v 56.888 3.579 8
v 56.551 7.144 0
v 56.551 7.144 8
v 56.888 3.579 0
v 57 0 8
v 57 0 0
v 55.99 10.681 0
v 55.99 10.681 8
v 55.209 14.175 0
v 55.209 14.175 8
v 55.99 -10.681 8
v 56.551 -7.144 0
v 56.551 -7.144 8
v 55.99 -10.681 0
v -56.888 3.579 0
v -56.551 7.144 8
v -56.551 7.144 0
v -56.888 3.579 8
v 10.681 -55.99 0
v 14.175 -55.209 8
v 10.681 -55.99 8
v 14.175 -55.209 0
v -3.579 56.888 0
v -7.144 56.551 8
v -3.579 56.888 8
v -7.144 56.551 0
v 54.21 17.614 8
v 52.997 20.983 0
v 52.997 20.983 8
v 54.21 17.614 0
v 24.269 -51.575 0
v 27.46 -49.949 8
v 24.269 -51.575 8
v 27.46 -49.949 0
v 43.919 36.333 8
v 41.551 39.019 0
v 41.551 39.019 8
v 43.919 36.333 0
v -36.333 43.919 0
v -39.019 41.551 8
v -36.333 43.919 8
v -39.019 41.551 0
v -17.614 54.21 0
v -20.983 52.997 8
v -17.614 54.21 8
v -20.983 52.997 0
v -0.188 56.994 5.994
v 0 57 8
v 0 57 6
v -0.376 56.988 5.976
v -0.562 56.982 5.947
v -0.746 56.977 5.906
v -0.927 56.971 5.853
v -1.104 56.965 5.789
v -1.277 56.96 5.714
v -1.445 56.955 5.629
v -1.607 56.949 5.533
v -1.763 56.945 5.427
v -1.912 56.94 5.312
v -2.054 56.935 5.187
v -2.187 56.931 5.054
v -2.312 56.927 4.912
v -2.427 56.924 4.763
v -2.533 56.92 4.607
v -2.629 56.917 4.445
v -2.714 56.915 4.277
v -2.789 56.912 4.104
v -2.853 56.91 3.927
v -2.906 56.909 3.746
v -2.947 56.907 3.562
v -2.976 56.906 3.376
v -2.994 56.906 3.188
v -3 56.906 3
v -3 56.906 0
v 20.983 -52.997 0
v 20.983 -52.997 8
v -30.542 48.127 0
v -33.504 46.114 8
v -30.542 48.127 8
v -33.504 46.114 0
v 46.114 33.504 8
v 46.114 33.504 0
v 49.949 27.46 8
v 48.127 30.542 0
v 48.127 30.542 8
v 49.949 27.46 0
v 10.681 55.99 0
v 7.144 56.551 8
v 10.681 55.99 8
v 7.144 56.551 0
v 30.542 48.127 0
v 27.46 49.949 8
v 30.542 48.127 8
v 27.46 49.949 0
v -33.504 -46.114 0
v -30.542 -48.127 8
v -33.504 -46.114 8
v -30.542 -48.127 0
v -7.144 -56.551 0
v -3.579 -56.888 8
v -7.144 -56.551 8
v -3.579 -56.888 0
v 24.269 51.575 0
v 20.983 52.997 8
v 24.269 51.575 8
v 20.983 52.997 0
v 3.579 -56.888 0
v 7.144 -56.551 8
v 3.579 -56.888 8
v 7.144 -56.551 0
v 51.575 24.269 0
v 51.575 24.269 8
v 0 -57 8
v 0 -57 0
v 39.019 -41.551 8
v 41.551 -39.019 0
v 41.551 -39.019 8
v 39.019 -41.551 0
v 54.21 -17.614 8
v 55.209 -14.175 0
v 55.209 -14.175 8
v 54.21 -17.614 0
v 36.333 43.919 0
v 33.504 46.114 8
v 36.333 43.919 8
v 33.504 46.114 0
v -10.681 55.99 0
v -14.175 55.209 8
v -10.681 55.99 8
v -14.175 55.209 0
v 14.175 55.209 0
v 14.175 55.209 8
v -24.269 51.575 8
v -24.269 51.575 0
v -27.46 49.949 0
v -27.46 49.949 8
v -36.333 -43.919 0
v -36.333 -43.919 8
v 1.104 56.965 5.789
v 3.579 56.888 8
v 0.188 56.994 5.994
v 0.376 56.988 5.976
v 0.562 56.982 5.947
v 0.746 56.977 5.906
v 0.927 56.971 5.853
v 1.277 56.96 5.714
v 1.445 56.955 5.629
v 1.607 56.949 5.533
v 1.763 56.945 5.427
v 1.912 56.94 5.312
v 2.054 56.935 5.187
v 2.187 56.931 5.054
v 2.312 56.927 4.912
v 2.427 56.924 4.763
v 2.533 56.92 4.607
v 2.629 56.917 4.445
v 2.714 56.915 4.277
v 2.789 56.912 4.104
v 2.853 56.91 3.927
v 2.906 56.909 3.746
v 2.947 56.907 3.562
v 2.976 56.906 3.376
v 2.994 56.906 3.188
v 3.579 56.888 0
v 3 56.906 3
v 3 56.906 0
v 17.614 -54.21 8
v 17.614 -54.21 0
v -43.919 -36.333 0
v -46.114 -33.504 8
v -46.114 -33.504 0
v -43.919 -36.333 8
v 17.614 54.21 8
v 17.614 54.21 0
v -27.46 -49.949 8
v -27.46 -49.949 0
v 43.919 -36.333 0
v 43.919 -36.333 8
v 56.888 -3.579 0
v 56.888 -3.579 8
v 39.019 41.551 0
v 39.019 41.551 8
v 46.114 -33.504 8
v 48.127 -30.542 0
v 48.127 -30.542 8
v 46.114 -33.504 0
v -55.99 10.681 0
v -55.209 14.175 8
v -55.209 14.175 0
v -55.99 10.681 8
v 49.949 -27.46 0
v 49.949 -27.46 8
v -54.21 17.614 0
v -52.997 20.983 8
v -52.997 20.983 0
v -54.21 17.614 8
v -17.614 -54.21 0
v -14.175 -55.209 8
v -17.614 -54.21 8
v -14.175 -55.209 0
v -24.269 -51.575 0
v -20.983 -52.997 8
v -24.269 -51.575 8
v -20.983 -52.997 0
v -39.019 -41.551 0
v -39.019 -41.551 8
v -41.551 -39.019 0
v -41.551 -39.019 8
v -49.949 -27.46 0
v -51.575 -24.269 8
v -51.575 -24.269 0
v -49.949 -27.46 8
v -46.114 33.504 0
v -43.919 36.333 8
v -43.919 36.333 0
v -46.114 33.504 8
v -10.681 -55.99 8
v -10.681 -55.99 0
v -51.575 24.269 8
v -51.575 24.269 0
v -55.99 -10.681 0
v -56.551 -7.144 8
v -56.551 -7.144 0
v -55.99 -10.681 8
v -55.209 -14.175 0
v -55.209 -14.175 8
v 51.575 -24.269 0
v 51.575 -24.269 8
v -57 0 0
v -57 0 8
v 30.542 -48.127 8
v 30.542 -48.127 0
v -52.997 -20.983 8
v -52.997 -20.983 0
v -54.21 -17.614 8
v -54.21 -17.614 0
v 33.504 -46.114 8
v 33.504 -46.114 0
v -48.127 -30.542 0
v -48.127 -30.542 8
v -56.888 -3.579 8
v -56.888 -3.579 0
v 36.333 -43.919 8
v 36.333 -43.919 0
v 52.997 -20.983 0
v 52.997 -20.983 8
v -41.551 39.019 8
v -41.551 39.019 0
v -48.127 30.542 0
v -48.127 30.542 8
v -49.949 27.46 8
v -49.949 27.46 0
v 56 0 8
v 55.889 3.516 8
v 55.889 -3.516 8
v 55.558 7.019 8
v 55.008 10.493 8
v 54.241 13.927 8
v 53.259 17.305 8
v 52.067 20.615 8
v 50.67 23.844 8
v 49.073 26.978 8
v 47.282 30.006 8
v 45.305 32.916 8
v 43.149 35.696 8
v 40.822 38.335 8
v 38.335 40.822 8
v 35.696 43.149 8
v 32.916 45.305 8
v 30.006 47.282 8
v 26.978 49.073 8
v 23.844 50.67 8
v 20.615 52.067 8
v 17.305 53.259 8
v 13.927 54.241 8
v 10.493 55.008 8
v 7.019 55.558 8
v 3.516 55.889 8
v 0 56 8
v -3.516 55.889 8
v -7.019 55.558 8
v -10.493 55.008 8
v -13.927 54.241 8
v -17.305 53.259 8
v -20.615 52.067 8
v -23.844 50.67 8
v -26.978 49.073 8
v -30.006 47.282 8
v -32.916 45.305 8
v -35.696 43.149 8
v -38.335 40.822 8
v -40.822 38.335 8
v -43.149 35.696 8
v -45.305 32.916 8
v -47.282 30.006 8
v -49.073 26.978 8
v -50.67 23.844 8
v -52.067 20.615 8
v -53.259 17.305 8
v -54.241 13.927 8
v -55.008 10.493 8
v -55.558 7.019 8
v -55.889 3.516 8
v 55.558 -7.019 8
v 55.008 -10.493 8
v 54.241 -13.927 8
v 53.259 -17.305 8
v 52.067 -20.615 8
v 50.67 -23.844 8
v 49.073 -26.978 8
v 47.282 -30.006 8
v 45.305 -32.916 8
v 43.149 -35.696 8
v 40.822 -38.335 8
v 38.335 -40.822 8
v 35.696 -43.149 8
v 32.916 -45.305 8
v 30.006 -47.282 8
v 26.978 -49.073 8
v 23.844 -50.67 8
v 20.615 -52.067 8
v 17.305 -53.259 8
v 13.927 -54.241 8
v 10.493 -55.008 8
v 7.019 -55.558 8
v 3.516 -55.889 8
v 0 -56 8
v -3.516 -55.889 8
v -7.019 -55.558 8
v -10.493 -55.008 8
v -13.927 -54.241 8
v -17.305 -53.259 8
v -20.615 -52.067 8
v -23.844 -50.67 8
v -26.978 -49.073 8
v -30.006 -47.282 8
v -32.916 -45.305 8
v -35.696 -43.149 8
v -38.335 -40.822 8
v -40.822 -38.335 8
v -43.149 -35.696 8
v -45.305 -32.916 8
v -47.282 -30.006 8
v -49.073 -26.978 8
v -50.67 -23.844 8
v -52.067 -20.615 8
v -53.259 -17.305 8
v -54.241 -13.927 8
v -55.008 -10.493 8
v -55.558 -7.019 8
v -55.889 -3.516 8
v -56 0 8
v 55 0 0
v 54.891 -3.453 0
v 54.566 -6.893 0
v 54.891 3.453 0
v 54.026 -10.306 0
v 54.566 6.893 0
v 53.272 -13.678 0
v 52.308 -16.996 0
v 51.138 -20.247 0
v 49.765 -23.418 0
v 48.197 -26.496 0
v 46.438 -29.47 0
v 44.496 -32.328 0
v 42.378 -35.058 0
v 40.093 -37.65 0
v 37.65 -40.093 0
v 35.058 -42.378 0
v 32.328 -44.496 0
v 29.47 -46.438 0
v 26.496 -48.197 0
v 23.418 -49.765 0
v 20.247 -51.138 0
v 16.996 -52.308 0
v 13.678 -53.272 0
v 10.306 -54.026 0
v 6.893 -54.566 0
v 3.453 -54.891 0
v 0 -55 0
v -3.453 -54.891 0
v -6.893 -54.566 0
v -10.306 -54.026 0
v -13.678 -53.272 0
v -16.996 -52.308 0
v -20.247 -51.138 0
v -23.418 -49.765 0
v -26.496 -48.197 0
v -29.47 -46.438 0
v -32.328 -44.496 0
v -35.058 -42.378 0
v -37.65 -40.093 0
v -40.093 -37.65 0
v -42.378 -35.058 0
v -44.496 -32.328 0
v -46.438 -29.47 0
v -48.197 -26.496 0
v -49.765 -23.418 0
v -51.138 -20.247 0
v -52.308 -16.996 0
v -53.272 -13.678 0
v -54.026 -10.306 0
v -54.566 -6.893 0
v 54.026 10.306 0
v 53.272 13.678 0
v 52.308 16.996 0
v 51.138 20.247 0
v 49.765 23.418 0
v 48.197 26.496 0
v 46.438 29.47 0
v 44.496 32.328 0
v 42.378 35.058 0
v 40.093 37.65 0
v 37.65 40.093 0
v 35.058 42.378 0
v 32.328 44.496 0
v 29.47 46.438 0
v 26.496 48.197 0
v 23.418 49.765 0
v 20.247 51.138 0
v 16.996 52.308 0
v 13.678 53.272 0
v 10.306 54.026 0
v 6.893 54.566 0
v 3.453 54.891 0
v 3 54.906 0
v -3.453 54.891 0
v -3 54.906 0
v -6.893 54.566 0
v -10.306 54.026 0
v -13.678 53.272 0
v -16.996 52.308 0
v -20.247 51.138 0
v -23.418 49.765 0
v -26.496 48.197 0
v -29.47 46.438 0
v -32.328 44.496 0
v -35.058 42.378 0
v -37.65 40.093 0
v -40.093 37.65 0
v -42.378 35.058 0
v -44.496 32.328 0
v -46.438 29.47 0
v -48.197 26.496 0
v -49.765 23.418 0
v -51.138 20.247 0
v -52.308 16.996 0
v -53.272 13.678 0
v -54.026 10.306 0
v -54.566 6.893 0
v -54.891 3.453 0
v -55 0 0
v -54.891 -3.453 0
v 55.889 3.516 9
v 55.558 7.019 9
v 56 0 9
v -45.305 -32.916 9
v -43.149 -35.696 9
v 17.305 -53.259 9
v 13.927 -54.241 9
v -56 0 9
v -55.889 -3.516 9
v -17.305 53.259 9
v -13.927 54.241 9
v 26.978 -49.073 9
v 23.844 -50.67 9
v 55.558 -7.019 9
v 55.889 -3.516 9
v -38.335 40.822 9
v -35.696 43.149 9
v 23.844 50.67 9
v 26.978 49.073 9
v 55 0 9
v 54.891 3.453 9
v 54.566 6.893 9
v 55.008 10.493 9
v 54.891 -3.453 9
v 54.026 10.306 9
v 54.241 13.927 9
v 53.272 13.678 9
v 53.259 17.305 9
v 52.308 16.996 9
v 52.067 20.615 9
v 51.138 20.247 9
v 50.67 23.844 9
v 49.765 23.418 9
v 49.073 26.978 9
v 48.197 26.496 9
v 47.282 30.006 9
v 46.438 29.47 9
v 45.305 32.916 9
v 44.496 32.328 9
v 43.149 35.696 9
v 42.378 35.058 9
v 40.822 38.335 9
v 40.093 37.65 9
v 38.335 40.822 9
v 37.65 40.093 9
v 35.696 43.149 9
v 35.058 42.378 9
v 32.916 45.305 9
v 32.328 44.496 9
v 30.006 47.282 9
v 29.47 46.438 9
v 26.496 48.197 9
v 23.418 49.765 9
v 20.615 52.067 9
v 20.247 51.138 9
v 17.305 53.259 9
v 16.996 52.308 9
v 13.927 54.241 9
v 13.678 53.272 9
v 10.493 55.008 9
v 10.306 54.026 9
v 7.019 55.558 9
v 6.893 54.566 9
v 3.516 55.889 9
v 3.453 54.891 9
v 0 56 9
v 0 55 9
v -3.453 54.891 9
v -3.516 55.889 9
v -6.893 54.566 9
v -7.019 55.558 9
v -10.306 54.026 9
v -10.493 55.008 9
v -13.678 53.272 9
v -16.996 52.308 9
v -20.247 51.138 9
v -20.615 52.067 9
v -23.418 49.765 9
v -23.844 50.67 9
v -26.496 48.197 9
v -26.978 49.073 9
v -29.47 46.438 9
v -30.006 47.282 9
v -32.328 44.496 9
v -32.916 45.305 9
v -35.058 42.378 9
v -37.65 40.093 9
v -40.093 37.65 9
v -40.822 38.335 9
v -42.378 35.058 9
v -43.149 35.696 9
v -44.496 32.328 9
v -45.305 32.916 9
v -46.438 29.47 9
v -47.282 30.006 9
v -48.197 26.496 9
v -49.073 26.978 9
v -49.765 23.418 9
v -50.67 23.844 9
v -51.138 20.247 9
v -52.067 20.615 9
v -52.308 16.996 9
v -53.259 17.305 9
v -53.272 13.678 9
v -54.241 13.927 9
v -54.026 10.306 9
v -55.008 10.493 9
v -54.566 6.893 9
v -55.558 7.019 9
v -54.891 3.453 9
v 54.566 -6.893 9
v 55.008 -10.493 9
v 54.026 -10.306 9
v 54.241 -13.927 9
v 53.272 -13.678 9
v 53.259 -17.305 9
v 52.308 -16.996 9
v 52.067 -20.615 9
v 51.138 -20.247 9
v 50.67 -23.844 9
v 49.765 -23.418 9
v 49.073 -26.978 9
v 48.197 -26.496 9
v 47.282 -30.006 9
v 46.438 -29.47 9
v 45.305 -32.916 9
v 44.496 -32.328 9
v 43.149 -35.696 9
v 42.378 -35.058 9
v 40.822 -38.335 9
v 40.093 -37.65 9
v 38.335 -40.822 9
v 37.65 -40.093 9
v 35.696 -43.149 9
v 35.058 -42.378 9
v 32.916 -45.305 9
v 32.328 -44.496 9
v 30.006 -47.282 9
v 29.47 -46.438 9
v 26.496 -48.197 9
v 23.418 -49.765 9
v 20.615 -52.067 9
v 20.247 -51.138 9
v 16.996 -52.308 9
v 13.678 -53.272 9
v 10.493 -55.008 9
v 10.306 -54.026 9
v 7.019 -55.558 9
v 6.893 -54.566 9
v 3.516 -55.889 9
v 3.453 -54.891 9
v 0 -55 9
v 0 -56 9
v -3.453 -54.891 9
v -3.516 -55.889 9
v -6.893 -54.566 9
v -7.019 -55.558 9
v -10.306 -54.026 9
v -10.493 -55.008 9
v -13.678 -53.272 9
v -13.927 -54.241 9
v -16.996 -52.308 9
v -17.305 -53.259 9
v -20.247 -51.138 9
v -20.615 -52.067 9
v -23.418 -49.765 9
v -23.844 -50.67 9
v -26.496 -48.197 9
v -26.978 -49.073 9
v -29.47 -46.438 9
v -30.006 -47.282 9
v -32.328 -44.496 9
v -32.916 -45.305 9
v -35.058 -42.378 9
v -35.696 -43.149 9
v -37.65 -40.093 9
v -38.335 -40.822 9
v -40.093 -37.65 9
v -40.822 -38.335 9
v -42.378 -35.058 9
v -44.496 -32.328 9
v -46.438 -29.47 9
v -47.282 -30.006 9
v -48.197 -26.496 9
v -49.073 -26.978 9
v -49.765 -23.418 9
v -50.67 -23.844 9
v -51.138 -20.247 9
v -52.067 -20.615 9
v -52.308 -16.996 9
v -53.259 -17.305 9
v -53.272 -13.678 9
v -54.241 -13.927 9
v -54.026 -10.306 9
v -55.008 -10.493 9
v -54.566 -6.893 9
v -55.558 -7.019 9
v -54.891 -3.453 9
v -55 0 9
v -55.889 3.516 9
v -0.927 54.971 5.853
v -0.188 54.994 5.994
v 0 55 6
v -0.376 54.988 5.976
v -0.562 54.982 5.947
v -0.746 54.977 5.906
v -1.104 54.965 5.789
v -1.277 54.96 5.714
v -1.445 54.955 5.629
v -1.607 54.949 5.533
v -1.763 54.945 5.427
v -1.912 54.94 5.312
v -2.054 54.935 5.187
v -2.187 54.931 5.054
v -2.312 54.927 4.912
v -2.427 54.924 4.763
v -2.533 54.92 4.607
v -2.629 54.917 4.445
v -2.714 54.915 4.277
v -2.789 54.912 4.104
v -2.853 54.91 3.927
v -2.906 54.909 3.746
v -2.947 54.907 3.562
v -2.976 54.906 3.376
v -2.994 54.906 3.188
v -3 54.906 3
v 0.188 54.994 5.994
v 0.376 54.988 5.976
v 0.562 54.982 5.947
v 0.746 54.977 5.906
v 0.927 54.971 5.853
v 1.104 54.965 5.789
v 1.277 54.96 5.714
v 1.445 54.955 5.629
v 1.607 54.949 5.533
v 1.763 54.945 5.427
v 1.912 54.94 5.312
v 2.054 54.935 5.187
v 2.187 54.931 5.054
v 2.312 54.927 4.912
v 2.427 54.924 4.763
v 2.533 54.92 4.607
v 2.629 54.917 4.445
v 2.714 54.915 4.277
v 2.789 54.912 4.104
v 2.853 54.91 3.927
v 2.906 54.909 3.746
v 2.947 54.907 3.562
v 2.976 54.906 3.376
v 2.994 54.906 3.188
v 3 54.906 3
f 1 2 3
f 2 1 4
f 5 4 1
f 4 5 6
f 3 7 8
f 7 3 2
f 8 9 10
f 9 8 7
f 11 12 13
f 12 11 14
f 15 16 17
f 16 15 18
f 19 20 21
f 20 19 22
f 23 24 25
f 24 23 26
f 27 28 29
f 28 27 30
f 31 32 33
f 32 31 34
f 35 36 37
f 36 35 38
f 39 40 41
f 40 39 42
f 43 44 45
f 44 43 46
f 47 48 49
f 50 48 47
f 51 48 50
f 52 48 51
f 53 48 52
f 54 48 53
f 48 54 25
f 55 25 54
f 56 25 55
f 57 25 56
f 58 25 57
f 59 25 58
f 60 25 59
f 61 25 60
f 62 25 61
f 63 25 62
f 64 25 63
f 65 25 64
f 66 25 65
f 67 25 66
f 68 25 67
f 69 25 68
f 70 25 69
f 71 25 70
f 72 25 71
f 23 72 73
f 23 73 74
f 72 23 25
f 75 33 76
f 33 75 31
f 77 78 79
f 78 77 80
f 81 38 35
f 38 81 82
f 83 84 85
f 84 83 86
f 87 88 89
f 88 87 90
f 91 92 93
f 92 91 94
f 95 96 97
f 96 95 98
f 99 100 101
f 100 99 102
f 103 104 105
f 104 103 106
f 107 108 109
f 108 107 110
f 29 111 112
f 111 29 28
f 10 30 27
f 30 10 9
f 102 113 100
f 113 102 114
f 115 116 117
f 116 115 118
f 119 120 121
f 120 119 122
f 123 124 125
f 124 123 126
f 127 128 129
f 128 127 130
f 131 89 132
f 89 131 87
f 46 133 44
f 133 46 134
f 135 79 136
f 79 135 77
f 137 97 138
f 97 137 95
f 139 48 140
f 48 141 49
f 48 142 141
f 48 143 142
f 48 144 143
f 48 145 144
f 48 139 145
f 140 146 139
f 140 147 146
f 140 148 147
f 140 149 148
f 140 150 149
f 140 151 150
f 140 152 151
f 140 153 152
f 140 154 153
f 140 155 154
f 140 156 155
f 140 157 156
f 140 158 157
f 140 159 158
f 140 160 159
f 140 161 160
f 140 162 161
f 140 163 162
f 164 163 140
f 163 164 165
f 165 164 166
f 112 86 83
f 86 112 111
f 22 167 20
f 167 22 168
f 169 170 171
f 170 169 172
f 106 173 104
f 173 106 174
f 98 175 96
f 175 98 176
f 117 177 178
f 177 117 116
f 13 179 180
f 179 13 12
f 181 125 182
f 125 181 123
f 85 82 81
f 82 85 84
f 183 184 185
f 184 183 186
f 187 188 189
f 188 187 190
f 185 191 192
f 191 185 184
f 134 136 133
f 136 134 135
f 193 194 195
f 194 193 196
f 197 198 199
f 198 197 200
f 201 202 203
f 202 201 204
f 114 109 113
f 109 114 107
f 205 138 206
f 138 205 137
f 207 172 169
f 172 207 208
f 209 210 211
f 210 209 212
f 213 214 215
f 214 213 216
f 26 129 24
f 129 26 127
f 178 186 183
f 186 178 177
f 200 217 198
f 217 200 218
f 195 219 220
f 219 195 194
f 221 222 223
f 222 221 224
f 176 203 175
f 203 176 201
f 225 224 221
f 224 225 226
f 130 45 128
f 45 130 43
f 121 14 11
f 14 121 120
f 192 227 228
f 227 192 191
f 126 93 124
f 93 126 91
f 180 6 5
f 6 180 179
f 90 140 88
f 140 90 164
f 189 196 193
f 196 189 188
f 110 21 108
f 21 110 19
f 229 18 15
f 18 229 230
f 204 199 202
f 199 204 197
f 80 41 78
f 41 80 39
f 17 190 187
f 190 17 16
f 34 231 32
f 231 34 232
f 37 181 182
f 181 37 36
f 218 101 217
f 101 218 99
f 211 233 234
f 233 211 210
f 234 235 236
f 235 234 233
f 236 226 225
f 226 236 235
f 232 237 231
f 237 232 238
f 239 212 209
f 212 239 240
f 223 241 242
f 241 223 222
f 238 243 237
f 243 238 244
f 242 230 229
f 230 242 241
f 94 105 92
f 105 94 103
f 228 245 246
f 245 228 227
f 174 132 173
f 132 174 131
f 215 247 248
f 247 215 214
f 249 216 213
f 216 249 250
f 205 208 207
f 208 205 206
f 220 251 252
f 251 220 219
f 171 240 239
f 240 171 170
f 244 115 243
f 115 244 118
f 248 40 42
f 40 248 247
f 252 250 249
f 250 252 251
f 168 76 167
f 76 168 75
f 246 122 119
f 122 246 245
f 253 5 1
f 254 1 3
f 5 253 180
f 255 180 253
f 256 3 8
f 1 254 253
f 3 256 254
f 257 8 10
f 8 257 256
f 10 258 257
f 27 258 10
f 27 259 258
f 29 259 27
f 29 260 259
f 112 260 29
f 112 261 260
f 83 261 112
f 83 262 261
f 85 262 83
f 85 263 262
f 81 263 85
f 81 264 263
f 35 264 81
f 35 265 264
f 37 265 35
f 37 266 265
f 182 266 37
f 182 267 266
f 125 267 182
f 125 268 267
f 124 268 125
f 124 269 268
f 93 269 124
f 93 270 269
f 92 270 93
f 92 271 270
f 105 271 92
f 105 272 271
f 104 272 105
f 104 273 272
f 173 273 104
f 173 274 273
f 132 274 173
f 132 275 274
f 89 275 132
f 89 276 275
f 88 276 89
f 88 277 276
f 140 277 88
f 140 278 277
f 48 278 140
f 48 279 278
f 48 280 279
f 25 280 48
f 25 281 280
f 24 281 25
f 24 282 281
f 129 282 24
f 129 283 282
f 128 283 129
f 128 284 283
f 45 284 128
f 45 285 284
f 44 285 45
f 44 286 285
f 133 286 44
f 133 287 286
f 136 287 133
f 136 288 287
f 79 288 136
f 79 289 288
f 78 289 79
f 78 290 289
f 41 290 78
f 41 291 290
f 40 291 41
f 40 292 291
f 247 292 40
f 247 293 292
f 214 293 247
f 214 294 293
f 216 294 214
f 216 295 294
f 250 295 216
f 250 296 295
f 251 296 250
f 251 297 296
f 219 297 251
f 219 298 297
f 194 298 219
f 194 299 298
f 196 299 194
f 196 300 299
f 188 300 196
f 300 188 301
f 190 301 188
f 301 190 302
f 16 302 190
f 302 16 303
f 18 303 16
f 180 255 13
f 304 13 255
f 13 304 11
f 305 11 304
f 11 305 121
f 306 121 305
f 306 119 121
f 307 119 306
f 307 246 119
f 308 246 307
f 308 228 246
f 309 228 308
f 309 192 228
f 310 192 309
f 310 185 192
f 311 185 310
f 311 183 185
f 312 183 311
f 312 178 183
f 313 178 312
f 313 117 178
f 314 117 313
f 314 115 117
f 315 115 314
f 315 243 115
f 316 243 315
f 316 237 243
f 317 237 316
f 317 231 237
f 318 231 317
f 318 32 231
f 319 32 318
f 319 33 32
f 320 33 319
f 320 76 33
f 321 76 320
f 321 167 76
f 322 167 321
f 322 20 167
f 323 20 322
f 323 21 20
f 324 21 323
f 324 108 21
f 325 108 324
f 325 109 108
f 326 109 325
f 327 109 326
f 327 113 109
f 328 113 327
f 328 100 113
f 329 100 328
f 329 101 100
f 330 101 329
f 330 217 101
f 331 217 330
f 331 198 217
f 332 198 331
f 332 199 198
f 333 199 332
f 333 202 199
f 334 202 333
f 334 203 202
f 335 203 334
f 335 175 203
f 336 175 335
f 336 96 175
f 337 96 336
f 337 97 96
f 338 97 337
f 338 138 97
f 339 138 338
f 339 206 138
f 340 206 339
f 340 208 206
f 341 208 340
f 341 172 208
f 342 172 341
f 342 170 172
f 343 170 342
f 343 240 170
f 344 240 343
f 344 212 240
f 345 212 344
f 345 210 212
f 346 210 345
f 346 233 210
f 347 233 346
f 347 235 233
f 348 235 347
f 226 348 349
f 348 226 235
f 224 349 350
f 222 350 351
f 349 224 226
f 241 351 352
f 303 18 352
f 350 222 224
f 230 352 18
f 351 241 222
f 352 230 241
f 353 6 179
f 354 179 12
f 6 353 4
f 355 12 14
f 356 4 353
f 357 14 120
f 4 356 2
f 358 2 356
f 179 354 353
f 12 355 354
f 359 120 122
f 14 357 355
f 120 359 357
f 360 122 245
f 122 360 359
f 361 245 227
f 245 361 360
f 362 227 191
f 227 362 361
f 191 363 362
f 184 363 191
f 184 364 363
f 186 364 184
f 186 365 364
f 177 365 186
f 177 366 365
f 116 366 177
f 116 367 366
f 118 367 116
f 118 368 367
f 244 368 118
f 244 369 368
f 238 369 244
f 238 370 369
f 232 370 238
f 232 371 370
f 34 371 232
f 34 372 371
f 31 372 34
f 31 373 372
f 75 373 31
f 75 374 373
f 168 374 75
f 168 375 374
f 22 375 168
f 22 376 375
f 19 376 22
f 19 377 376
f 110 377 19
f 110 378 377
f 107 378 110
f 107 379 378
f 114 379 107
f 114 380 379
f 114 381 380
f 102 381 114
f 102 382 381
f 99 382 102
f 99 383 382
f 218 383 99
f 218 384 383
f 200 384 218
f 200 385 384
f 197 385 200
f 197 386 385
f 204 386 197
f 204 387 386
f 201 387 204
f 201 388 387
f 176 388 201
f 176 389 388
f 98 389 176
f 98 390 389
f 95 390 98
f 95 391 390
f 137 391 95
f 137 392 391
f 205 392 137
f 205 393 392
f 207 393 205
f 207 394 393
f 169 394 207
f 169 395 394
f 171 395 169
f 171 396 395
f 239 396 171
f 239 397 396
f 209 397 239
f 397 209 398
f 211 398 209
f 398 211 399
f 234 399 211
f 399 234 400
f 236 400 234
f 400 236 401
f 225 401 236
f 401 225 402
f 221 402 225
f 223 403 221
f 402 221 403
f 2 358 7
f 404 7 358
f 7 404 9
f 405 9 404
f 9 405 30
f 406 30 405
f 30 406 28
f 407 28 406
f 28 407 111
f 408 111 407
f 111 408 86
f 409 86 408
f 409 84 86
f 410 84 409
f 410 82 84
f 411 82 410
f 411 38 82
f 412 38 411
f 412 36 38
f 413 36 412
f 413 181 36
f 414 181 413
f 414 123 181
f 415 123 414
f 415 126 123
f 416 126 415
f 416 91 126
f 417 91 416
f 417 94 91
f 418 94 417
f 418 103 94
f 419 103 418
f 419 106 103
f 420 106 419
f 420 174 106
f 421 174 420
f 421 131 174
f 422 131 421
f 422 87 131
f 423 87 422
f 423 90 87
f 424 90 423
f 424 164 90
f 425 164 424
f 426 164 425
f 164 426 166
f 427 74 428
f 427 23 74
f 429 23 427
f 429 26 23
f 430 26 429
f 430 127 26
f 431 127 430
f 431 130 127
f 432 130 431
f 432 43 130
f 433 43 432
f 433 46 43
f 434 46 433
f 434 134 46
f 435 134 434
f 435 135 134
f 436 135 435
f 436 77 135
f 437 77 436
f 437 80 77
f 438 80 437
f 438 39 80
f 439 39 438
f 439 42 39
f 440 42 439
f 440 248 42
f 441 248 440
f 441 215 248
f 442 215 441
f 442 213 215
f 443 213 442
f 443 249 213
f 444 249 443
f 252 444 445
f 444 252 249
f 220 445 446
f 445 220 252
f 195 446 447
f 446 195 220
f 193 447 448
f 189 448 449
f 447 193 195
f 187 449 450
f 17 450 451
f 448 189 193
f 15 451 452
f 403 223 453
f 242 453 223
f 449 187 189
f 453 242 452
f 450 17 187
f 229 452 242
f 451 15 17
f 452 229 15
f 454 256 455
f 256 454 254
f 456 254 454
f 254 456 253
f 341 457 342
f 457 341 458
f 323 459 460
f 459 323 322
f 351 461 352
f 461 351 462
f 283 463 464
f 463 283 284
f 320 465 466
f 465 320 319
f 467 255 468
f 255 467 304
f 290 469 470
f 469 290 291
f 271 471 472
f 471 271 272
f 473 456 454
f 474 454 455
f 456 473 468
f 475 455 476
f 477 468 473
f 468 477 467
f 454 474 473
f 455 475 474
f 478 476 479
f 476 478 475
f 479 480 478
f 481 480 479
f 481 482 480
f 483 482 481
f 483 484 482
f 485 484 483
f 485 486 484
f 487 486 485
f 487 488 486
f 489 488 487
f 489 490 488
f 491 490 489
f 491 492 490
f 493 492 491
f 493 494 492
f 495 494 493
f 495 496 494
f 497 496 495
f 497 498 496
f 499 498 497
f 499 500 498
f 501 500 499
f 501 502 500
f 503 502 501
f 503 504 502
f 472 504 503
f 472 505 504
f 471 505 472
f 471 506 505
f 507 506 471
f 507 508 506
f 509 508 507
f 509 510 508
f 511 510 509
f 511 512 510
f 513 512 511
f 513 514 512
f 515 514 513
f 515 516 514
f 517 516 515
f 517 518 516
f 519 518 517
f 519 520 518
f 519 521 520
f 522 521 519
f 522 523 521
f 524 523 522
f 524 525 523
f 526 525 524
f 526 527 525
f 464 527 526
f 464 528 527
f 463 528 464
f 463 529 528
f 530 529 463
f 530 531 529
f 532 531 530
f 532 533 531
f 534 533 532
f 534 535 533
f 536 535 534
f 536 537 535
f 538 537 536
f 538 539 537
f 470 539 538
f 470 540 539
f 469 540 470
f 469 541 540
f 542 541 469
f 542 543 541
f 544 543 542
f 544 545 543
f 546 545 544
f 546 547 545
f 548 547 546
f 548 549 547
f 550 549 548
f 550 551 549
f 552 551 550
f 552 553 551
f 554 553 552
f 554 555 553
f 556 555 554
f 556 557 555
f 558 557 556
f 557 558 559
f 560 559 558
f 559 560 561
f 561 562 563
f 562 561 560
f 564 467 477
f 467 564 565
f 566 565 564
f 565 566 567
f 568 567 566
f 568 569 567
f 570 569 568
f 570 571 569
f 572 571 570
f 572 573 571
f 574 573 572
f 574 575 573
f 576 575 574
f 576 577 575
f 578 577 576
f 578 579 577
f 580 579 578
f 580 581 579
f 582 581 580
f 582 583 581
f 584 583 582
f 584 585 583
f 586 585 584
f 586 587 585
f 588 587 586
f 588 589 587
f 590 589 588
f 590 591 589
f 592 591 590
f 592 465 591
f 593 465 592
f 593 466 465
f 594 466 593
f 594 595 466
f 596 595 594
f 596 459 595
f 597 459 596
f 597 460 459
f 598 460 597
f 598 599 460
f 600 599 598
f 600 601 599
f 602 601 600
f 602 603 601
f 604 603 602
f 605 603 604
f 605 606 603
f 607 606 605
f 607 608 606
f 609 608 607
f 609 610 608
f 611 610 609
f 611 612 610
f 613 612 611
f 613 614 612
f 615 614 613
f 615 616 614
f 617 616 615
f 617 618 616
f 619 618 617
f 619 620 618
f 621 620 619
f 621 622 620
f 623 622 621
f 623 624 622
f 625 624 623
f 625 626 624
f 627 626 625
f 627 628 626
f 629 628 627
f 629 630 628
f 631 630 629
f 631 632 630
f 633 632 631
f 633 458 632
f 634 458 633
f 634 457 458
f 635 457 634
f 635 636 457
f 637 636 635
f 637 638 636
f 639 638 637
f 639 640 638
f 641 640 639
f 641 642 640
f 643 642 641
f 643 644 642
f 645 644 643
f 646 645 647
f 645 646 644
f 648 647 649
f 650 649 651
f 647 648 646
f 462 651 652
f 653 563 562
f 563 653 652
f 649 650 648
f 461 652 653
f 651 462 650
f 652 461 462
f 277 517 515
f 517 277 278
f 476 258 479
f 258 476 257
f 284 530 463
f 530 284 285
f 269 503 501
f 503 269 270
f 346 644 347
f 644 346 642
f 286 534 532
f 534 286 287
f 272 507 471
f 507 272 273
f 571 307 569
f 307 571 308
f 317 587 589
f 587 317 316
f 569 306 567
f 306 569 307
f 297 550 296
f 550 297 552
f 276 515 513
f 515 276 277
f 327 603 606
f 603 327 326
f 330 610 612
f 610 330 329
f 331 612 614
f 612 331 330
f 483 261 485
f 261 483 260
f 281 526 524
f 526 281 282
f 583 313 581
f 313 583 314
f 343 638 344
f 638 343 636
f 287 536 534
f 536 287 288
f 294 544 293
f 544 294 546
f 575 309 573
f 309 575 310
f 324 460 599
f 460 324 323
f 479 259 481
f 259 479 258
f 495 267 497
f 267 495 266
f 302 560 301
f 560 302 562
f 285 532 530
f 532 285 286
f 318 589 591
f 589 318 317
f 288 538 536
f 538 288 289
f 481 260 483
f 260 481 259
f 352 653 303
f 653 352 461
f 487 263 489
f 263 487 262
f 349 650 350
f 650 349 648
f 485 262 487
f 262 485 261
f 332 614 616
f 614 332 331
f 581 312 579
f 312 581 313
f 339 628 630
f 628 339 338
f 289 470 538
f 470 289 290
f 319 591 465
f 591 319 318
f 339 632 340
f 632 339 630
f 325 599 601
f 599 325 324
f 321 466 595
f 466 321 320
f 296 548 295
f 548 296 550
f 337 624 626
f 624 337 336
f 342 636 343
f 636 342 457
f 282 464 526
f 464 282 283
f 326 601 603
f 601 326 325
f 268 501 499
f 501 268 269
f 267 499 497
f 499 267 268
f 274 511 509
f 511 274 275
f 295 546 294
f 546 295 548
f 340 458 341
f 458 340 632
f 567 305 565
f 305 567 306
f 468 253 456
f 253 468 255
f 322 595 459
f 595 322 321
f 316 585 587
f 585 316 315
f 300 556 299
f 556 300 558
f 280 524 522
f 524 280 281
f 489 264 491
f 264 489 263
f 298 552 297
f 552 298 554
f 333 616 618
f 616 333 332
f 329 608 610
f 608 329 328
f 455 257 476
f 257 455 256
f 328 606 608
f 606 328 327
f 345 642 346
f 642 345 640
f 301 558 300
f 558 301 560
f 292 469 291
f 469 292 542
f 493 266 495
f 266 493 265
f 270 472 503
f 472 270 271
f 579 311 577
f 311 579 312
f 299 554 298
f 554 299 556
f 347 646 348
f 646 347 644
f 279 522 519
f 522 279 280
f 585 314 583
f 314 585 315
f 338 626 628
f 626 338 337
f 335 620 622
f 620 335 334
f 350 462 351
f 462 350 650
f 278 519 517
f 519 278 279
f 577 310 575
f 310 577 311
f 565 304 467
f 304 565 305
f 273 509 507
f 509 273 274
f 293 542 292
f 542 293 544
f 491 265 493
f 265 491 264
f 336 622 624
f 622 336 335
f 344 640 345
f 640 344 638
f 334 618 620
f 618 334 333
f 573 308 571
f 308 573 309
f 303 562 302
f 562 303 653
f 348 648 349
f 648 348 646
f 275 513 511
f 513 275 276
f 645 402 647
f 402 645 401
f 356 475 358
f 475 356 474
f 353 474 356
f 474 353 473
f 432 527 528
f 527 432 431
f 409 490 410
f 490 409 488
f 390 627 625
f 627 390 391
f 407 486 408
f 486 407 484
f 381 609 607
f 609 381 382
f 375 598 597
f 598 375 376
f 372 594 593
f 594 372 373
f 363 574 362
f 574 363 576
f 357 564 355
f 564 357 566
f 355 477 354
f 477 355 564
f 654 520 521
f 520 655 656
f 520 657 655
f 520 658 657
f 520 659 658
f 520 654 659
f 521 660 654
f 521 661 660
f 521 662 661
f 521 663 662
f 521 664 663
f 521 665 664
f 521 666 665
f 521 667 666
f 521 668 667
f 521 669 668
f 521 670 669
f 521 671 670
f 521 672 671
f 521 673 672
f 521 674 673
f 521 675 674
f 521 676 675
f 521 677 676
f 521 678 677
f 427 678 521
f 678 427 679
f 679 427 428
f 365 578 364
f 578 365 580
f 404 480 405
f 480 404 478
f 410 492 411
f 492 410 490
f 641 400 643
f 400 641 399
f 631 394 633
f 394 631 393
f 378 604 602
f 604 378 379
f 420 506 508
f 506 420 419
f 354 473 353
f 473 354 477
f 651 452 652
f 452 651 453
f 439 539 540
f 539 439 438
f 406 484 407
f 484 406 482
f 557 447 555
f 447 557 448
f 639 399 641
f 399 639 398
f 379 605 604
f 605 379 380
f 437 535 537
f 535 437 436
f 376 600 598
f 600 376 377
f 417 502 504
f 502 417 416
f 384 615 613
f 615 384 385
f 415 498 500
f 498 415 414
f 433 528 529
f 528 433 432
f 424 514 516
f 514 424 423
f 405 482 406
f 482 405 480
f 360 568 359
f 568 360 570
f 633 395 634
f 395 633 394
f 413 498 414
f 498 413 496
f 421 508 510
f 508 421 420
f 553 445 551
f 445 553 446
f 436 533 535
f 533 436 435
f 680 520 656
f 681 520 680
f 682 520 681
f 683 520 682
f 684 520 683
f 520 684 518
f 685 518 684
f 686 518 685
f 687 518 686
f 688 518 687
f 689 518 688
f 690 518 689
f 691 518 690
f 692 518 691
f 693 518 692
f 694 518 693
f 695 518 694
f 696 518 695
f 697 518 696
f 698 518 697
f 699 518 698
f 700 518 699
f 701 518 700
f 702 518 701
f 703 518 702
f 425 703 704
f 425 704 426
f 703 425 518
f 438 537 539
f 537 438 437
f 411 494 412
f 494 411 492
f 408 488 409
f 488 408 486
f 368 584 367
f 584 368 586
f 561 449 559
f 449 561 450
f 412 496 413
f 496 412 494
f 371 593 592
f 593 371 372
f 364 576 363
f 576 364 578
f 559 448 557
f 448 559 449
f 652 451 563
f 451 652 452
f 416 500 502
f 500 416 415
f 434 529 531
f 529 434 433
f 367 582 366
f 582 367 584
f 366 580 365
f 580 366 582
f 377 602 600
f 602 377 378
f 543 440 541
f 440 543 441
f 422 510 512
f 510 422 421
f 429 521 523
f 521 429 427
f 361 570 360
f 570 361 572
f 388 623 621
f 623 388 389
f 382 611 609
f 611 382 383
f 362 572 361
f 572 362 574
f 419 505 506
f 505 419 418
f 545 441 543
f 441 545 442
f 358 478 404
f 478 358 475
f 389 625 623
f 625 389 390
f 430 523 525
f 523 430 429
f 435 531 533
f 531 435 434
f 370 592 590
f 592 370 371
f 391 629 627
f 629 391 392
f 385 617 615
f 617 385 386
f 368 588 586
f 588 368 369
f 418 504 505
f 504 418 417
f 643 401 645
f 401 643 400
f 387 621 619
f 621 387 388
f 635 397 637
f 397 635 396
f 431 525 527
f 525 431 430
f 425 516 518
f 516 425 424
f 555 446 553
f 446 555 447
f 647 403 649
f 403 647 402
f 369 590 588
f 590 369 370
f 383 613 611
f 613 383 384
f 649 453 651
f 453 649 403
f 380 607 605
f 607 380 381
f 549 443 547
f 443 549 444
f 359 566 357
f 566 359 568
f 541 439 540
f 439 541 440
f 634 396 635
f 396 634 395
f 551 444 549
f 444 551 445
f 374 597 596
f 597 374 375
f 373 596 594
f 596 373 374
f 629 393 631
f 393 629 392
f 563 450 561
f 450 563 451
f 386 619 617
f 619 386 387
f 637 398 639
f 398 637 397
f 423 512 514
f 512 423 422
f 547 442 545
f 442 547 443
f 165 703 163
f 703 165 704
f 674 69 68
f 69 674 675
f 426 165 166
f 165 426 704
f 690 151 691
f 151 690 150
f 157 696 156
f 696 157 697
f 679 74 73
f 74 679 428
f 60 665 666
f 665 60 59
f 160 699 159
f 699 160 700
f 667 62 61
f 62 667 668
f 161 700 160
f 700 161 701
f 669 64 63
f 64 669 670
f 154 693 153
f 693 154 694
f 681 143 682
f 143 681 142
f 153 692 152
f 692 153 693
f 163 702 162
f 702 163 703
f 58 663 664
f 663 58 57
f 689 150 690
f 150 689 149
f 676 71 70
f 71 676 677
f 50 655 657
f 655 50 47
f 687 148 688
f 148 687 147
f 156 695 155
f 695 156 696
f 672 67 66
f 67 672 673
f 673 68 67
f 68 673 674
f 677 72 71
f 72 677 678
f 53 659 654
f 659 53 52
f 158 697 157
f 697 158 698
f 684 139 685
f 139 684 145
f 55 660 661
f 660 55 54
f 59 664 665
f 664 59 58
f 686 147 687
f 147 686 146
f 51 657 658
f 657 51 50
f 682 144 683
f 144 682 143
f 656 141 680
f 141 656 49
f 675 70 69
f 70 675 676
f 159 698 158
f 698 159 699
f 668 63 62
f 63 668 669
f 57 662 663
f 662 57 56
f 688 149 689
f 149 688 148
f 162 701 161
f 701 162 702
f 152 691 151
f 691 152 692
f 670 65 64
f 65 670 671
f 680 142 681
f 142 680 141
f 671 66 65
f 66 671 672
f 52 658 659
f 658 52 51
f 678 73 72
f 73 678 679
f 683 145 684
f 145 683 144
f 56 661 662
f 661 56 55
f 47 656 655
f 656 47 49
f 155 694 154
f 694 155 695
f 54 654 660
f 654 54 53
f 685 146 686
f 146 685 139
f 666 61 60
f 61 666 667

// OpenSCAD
//ABB_peitelevyn_AK1.1P_koroke
// 2017-12-17
wire=6;
height=wire+2;
wall=2;
$fn=100;



difference(){
    union(){
    cylinder(r=114/2, h=height);
    cylinder(r=112/2, h=height+1);
    }
    translate([0,0,-1])
    cylinder(r=114/2-wall, h=height+3);
    translate([0,114/2+10,wire/2])
    rotate([90,0,0])
    hull(){
        cylinder(r=wire/2, h=20);
        translate([0,-wire,0])
        cylinder(r=wire/2, h=20);
    }
}
